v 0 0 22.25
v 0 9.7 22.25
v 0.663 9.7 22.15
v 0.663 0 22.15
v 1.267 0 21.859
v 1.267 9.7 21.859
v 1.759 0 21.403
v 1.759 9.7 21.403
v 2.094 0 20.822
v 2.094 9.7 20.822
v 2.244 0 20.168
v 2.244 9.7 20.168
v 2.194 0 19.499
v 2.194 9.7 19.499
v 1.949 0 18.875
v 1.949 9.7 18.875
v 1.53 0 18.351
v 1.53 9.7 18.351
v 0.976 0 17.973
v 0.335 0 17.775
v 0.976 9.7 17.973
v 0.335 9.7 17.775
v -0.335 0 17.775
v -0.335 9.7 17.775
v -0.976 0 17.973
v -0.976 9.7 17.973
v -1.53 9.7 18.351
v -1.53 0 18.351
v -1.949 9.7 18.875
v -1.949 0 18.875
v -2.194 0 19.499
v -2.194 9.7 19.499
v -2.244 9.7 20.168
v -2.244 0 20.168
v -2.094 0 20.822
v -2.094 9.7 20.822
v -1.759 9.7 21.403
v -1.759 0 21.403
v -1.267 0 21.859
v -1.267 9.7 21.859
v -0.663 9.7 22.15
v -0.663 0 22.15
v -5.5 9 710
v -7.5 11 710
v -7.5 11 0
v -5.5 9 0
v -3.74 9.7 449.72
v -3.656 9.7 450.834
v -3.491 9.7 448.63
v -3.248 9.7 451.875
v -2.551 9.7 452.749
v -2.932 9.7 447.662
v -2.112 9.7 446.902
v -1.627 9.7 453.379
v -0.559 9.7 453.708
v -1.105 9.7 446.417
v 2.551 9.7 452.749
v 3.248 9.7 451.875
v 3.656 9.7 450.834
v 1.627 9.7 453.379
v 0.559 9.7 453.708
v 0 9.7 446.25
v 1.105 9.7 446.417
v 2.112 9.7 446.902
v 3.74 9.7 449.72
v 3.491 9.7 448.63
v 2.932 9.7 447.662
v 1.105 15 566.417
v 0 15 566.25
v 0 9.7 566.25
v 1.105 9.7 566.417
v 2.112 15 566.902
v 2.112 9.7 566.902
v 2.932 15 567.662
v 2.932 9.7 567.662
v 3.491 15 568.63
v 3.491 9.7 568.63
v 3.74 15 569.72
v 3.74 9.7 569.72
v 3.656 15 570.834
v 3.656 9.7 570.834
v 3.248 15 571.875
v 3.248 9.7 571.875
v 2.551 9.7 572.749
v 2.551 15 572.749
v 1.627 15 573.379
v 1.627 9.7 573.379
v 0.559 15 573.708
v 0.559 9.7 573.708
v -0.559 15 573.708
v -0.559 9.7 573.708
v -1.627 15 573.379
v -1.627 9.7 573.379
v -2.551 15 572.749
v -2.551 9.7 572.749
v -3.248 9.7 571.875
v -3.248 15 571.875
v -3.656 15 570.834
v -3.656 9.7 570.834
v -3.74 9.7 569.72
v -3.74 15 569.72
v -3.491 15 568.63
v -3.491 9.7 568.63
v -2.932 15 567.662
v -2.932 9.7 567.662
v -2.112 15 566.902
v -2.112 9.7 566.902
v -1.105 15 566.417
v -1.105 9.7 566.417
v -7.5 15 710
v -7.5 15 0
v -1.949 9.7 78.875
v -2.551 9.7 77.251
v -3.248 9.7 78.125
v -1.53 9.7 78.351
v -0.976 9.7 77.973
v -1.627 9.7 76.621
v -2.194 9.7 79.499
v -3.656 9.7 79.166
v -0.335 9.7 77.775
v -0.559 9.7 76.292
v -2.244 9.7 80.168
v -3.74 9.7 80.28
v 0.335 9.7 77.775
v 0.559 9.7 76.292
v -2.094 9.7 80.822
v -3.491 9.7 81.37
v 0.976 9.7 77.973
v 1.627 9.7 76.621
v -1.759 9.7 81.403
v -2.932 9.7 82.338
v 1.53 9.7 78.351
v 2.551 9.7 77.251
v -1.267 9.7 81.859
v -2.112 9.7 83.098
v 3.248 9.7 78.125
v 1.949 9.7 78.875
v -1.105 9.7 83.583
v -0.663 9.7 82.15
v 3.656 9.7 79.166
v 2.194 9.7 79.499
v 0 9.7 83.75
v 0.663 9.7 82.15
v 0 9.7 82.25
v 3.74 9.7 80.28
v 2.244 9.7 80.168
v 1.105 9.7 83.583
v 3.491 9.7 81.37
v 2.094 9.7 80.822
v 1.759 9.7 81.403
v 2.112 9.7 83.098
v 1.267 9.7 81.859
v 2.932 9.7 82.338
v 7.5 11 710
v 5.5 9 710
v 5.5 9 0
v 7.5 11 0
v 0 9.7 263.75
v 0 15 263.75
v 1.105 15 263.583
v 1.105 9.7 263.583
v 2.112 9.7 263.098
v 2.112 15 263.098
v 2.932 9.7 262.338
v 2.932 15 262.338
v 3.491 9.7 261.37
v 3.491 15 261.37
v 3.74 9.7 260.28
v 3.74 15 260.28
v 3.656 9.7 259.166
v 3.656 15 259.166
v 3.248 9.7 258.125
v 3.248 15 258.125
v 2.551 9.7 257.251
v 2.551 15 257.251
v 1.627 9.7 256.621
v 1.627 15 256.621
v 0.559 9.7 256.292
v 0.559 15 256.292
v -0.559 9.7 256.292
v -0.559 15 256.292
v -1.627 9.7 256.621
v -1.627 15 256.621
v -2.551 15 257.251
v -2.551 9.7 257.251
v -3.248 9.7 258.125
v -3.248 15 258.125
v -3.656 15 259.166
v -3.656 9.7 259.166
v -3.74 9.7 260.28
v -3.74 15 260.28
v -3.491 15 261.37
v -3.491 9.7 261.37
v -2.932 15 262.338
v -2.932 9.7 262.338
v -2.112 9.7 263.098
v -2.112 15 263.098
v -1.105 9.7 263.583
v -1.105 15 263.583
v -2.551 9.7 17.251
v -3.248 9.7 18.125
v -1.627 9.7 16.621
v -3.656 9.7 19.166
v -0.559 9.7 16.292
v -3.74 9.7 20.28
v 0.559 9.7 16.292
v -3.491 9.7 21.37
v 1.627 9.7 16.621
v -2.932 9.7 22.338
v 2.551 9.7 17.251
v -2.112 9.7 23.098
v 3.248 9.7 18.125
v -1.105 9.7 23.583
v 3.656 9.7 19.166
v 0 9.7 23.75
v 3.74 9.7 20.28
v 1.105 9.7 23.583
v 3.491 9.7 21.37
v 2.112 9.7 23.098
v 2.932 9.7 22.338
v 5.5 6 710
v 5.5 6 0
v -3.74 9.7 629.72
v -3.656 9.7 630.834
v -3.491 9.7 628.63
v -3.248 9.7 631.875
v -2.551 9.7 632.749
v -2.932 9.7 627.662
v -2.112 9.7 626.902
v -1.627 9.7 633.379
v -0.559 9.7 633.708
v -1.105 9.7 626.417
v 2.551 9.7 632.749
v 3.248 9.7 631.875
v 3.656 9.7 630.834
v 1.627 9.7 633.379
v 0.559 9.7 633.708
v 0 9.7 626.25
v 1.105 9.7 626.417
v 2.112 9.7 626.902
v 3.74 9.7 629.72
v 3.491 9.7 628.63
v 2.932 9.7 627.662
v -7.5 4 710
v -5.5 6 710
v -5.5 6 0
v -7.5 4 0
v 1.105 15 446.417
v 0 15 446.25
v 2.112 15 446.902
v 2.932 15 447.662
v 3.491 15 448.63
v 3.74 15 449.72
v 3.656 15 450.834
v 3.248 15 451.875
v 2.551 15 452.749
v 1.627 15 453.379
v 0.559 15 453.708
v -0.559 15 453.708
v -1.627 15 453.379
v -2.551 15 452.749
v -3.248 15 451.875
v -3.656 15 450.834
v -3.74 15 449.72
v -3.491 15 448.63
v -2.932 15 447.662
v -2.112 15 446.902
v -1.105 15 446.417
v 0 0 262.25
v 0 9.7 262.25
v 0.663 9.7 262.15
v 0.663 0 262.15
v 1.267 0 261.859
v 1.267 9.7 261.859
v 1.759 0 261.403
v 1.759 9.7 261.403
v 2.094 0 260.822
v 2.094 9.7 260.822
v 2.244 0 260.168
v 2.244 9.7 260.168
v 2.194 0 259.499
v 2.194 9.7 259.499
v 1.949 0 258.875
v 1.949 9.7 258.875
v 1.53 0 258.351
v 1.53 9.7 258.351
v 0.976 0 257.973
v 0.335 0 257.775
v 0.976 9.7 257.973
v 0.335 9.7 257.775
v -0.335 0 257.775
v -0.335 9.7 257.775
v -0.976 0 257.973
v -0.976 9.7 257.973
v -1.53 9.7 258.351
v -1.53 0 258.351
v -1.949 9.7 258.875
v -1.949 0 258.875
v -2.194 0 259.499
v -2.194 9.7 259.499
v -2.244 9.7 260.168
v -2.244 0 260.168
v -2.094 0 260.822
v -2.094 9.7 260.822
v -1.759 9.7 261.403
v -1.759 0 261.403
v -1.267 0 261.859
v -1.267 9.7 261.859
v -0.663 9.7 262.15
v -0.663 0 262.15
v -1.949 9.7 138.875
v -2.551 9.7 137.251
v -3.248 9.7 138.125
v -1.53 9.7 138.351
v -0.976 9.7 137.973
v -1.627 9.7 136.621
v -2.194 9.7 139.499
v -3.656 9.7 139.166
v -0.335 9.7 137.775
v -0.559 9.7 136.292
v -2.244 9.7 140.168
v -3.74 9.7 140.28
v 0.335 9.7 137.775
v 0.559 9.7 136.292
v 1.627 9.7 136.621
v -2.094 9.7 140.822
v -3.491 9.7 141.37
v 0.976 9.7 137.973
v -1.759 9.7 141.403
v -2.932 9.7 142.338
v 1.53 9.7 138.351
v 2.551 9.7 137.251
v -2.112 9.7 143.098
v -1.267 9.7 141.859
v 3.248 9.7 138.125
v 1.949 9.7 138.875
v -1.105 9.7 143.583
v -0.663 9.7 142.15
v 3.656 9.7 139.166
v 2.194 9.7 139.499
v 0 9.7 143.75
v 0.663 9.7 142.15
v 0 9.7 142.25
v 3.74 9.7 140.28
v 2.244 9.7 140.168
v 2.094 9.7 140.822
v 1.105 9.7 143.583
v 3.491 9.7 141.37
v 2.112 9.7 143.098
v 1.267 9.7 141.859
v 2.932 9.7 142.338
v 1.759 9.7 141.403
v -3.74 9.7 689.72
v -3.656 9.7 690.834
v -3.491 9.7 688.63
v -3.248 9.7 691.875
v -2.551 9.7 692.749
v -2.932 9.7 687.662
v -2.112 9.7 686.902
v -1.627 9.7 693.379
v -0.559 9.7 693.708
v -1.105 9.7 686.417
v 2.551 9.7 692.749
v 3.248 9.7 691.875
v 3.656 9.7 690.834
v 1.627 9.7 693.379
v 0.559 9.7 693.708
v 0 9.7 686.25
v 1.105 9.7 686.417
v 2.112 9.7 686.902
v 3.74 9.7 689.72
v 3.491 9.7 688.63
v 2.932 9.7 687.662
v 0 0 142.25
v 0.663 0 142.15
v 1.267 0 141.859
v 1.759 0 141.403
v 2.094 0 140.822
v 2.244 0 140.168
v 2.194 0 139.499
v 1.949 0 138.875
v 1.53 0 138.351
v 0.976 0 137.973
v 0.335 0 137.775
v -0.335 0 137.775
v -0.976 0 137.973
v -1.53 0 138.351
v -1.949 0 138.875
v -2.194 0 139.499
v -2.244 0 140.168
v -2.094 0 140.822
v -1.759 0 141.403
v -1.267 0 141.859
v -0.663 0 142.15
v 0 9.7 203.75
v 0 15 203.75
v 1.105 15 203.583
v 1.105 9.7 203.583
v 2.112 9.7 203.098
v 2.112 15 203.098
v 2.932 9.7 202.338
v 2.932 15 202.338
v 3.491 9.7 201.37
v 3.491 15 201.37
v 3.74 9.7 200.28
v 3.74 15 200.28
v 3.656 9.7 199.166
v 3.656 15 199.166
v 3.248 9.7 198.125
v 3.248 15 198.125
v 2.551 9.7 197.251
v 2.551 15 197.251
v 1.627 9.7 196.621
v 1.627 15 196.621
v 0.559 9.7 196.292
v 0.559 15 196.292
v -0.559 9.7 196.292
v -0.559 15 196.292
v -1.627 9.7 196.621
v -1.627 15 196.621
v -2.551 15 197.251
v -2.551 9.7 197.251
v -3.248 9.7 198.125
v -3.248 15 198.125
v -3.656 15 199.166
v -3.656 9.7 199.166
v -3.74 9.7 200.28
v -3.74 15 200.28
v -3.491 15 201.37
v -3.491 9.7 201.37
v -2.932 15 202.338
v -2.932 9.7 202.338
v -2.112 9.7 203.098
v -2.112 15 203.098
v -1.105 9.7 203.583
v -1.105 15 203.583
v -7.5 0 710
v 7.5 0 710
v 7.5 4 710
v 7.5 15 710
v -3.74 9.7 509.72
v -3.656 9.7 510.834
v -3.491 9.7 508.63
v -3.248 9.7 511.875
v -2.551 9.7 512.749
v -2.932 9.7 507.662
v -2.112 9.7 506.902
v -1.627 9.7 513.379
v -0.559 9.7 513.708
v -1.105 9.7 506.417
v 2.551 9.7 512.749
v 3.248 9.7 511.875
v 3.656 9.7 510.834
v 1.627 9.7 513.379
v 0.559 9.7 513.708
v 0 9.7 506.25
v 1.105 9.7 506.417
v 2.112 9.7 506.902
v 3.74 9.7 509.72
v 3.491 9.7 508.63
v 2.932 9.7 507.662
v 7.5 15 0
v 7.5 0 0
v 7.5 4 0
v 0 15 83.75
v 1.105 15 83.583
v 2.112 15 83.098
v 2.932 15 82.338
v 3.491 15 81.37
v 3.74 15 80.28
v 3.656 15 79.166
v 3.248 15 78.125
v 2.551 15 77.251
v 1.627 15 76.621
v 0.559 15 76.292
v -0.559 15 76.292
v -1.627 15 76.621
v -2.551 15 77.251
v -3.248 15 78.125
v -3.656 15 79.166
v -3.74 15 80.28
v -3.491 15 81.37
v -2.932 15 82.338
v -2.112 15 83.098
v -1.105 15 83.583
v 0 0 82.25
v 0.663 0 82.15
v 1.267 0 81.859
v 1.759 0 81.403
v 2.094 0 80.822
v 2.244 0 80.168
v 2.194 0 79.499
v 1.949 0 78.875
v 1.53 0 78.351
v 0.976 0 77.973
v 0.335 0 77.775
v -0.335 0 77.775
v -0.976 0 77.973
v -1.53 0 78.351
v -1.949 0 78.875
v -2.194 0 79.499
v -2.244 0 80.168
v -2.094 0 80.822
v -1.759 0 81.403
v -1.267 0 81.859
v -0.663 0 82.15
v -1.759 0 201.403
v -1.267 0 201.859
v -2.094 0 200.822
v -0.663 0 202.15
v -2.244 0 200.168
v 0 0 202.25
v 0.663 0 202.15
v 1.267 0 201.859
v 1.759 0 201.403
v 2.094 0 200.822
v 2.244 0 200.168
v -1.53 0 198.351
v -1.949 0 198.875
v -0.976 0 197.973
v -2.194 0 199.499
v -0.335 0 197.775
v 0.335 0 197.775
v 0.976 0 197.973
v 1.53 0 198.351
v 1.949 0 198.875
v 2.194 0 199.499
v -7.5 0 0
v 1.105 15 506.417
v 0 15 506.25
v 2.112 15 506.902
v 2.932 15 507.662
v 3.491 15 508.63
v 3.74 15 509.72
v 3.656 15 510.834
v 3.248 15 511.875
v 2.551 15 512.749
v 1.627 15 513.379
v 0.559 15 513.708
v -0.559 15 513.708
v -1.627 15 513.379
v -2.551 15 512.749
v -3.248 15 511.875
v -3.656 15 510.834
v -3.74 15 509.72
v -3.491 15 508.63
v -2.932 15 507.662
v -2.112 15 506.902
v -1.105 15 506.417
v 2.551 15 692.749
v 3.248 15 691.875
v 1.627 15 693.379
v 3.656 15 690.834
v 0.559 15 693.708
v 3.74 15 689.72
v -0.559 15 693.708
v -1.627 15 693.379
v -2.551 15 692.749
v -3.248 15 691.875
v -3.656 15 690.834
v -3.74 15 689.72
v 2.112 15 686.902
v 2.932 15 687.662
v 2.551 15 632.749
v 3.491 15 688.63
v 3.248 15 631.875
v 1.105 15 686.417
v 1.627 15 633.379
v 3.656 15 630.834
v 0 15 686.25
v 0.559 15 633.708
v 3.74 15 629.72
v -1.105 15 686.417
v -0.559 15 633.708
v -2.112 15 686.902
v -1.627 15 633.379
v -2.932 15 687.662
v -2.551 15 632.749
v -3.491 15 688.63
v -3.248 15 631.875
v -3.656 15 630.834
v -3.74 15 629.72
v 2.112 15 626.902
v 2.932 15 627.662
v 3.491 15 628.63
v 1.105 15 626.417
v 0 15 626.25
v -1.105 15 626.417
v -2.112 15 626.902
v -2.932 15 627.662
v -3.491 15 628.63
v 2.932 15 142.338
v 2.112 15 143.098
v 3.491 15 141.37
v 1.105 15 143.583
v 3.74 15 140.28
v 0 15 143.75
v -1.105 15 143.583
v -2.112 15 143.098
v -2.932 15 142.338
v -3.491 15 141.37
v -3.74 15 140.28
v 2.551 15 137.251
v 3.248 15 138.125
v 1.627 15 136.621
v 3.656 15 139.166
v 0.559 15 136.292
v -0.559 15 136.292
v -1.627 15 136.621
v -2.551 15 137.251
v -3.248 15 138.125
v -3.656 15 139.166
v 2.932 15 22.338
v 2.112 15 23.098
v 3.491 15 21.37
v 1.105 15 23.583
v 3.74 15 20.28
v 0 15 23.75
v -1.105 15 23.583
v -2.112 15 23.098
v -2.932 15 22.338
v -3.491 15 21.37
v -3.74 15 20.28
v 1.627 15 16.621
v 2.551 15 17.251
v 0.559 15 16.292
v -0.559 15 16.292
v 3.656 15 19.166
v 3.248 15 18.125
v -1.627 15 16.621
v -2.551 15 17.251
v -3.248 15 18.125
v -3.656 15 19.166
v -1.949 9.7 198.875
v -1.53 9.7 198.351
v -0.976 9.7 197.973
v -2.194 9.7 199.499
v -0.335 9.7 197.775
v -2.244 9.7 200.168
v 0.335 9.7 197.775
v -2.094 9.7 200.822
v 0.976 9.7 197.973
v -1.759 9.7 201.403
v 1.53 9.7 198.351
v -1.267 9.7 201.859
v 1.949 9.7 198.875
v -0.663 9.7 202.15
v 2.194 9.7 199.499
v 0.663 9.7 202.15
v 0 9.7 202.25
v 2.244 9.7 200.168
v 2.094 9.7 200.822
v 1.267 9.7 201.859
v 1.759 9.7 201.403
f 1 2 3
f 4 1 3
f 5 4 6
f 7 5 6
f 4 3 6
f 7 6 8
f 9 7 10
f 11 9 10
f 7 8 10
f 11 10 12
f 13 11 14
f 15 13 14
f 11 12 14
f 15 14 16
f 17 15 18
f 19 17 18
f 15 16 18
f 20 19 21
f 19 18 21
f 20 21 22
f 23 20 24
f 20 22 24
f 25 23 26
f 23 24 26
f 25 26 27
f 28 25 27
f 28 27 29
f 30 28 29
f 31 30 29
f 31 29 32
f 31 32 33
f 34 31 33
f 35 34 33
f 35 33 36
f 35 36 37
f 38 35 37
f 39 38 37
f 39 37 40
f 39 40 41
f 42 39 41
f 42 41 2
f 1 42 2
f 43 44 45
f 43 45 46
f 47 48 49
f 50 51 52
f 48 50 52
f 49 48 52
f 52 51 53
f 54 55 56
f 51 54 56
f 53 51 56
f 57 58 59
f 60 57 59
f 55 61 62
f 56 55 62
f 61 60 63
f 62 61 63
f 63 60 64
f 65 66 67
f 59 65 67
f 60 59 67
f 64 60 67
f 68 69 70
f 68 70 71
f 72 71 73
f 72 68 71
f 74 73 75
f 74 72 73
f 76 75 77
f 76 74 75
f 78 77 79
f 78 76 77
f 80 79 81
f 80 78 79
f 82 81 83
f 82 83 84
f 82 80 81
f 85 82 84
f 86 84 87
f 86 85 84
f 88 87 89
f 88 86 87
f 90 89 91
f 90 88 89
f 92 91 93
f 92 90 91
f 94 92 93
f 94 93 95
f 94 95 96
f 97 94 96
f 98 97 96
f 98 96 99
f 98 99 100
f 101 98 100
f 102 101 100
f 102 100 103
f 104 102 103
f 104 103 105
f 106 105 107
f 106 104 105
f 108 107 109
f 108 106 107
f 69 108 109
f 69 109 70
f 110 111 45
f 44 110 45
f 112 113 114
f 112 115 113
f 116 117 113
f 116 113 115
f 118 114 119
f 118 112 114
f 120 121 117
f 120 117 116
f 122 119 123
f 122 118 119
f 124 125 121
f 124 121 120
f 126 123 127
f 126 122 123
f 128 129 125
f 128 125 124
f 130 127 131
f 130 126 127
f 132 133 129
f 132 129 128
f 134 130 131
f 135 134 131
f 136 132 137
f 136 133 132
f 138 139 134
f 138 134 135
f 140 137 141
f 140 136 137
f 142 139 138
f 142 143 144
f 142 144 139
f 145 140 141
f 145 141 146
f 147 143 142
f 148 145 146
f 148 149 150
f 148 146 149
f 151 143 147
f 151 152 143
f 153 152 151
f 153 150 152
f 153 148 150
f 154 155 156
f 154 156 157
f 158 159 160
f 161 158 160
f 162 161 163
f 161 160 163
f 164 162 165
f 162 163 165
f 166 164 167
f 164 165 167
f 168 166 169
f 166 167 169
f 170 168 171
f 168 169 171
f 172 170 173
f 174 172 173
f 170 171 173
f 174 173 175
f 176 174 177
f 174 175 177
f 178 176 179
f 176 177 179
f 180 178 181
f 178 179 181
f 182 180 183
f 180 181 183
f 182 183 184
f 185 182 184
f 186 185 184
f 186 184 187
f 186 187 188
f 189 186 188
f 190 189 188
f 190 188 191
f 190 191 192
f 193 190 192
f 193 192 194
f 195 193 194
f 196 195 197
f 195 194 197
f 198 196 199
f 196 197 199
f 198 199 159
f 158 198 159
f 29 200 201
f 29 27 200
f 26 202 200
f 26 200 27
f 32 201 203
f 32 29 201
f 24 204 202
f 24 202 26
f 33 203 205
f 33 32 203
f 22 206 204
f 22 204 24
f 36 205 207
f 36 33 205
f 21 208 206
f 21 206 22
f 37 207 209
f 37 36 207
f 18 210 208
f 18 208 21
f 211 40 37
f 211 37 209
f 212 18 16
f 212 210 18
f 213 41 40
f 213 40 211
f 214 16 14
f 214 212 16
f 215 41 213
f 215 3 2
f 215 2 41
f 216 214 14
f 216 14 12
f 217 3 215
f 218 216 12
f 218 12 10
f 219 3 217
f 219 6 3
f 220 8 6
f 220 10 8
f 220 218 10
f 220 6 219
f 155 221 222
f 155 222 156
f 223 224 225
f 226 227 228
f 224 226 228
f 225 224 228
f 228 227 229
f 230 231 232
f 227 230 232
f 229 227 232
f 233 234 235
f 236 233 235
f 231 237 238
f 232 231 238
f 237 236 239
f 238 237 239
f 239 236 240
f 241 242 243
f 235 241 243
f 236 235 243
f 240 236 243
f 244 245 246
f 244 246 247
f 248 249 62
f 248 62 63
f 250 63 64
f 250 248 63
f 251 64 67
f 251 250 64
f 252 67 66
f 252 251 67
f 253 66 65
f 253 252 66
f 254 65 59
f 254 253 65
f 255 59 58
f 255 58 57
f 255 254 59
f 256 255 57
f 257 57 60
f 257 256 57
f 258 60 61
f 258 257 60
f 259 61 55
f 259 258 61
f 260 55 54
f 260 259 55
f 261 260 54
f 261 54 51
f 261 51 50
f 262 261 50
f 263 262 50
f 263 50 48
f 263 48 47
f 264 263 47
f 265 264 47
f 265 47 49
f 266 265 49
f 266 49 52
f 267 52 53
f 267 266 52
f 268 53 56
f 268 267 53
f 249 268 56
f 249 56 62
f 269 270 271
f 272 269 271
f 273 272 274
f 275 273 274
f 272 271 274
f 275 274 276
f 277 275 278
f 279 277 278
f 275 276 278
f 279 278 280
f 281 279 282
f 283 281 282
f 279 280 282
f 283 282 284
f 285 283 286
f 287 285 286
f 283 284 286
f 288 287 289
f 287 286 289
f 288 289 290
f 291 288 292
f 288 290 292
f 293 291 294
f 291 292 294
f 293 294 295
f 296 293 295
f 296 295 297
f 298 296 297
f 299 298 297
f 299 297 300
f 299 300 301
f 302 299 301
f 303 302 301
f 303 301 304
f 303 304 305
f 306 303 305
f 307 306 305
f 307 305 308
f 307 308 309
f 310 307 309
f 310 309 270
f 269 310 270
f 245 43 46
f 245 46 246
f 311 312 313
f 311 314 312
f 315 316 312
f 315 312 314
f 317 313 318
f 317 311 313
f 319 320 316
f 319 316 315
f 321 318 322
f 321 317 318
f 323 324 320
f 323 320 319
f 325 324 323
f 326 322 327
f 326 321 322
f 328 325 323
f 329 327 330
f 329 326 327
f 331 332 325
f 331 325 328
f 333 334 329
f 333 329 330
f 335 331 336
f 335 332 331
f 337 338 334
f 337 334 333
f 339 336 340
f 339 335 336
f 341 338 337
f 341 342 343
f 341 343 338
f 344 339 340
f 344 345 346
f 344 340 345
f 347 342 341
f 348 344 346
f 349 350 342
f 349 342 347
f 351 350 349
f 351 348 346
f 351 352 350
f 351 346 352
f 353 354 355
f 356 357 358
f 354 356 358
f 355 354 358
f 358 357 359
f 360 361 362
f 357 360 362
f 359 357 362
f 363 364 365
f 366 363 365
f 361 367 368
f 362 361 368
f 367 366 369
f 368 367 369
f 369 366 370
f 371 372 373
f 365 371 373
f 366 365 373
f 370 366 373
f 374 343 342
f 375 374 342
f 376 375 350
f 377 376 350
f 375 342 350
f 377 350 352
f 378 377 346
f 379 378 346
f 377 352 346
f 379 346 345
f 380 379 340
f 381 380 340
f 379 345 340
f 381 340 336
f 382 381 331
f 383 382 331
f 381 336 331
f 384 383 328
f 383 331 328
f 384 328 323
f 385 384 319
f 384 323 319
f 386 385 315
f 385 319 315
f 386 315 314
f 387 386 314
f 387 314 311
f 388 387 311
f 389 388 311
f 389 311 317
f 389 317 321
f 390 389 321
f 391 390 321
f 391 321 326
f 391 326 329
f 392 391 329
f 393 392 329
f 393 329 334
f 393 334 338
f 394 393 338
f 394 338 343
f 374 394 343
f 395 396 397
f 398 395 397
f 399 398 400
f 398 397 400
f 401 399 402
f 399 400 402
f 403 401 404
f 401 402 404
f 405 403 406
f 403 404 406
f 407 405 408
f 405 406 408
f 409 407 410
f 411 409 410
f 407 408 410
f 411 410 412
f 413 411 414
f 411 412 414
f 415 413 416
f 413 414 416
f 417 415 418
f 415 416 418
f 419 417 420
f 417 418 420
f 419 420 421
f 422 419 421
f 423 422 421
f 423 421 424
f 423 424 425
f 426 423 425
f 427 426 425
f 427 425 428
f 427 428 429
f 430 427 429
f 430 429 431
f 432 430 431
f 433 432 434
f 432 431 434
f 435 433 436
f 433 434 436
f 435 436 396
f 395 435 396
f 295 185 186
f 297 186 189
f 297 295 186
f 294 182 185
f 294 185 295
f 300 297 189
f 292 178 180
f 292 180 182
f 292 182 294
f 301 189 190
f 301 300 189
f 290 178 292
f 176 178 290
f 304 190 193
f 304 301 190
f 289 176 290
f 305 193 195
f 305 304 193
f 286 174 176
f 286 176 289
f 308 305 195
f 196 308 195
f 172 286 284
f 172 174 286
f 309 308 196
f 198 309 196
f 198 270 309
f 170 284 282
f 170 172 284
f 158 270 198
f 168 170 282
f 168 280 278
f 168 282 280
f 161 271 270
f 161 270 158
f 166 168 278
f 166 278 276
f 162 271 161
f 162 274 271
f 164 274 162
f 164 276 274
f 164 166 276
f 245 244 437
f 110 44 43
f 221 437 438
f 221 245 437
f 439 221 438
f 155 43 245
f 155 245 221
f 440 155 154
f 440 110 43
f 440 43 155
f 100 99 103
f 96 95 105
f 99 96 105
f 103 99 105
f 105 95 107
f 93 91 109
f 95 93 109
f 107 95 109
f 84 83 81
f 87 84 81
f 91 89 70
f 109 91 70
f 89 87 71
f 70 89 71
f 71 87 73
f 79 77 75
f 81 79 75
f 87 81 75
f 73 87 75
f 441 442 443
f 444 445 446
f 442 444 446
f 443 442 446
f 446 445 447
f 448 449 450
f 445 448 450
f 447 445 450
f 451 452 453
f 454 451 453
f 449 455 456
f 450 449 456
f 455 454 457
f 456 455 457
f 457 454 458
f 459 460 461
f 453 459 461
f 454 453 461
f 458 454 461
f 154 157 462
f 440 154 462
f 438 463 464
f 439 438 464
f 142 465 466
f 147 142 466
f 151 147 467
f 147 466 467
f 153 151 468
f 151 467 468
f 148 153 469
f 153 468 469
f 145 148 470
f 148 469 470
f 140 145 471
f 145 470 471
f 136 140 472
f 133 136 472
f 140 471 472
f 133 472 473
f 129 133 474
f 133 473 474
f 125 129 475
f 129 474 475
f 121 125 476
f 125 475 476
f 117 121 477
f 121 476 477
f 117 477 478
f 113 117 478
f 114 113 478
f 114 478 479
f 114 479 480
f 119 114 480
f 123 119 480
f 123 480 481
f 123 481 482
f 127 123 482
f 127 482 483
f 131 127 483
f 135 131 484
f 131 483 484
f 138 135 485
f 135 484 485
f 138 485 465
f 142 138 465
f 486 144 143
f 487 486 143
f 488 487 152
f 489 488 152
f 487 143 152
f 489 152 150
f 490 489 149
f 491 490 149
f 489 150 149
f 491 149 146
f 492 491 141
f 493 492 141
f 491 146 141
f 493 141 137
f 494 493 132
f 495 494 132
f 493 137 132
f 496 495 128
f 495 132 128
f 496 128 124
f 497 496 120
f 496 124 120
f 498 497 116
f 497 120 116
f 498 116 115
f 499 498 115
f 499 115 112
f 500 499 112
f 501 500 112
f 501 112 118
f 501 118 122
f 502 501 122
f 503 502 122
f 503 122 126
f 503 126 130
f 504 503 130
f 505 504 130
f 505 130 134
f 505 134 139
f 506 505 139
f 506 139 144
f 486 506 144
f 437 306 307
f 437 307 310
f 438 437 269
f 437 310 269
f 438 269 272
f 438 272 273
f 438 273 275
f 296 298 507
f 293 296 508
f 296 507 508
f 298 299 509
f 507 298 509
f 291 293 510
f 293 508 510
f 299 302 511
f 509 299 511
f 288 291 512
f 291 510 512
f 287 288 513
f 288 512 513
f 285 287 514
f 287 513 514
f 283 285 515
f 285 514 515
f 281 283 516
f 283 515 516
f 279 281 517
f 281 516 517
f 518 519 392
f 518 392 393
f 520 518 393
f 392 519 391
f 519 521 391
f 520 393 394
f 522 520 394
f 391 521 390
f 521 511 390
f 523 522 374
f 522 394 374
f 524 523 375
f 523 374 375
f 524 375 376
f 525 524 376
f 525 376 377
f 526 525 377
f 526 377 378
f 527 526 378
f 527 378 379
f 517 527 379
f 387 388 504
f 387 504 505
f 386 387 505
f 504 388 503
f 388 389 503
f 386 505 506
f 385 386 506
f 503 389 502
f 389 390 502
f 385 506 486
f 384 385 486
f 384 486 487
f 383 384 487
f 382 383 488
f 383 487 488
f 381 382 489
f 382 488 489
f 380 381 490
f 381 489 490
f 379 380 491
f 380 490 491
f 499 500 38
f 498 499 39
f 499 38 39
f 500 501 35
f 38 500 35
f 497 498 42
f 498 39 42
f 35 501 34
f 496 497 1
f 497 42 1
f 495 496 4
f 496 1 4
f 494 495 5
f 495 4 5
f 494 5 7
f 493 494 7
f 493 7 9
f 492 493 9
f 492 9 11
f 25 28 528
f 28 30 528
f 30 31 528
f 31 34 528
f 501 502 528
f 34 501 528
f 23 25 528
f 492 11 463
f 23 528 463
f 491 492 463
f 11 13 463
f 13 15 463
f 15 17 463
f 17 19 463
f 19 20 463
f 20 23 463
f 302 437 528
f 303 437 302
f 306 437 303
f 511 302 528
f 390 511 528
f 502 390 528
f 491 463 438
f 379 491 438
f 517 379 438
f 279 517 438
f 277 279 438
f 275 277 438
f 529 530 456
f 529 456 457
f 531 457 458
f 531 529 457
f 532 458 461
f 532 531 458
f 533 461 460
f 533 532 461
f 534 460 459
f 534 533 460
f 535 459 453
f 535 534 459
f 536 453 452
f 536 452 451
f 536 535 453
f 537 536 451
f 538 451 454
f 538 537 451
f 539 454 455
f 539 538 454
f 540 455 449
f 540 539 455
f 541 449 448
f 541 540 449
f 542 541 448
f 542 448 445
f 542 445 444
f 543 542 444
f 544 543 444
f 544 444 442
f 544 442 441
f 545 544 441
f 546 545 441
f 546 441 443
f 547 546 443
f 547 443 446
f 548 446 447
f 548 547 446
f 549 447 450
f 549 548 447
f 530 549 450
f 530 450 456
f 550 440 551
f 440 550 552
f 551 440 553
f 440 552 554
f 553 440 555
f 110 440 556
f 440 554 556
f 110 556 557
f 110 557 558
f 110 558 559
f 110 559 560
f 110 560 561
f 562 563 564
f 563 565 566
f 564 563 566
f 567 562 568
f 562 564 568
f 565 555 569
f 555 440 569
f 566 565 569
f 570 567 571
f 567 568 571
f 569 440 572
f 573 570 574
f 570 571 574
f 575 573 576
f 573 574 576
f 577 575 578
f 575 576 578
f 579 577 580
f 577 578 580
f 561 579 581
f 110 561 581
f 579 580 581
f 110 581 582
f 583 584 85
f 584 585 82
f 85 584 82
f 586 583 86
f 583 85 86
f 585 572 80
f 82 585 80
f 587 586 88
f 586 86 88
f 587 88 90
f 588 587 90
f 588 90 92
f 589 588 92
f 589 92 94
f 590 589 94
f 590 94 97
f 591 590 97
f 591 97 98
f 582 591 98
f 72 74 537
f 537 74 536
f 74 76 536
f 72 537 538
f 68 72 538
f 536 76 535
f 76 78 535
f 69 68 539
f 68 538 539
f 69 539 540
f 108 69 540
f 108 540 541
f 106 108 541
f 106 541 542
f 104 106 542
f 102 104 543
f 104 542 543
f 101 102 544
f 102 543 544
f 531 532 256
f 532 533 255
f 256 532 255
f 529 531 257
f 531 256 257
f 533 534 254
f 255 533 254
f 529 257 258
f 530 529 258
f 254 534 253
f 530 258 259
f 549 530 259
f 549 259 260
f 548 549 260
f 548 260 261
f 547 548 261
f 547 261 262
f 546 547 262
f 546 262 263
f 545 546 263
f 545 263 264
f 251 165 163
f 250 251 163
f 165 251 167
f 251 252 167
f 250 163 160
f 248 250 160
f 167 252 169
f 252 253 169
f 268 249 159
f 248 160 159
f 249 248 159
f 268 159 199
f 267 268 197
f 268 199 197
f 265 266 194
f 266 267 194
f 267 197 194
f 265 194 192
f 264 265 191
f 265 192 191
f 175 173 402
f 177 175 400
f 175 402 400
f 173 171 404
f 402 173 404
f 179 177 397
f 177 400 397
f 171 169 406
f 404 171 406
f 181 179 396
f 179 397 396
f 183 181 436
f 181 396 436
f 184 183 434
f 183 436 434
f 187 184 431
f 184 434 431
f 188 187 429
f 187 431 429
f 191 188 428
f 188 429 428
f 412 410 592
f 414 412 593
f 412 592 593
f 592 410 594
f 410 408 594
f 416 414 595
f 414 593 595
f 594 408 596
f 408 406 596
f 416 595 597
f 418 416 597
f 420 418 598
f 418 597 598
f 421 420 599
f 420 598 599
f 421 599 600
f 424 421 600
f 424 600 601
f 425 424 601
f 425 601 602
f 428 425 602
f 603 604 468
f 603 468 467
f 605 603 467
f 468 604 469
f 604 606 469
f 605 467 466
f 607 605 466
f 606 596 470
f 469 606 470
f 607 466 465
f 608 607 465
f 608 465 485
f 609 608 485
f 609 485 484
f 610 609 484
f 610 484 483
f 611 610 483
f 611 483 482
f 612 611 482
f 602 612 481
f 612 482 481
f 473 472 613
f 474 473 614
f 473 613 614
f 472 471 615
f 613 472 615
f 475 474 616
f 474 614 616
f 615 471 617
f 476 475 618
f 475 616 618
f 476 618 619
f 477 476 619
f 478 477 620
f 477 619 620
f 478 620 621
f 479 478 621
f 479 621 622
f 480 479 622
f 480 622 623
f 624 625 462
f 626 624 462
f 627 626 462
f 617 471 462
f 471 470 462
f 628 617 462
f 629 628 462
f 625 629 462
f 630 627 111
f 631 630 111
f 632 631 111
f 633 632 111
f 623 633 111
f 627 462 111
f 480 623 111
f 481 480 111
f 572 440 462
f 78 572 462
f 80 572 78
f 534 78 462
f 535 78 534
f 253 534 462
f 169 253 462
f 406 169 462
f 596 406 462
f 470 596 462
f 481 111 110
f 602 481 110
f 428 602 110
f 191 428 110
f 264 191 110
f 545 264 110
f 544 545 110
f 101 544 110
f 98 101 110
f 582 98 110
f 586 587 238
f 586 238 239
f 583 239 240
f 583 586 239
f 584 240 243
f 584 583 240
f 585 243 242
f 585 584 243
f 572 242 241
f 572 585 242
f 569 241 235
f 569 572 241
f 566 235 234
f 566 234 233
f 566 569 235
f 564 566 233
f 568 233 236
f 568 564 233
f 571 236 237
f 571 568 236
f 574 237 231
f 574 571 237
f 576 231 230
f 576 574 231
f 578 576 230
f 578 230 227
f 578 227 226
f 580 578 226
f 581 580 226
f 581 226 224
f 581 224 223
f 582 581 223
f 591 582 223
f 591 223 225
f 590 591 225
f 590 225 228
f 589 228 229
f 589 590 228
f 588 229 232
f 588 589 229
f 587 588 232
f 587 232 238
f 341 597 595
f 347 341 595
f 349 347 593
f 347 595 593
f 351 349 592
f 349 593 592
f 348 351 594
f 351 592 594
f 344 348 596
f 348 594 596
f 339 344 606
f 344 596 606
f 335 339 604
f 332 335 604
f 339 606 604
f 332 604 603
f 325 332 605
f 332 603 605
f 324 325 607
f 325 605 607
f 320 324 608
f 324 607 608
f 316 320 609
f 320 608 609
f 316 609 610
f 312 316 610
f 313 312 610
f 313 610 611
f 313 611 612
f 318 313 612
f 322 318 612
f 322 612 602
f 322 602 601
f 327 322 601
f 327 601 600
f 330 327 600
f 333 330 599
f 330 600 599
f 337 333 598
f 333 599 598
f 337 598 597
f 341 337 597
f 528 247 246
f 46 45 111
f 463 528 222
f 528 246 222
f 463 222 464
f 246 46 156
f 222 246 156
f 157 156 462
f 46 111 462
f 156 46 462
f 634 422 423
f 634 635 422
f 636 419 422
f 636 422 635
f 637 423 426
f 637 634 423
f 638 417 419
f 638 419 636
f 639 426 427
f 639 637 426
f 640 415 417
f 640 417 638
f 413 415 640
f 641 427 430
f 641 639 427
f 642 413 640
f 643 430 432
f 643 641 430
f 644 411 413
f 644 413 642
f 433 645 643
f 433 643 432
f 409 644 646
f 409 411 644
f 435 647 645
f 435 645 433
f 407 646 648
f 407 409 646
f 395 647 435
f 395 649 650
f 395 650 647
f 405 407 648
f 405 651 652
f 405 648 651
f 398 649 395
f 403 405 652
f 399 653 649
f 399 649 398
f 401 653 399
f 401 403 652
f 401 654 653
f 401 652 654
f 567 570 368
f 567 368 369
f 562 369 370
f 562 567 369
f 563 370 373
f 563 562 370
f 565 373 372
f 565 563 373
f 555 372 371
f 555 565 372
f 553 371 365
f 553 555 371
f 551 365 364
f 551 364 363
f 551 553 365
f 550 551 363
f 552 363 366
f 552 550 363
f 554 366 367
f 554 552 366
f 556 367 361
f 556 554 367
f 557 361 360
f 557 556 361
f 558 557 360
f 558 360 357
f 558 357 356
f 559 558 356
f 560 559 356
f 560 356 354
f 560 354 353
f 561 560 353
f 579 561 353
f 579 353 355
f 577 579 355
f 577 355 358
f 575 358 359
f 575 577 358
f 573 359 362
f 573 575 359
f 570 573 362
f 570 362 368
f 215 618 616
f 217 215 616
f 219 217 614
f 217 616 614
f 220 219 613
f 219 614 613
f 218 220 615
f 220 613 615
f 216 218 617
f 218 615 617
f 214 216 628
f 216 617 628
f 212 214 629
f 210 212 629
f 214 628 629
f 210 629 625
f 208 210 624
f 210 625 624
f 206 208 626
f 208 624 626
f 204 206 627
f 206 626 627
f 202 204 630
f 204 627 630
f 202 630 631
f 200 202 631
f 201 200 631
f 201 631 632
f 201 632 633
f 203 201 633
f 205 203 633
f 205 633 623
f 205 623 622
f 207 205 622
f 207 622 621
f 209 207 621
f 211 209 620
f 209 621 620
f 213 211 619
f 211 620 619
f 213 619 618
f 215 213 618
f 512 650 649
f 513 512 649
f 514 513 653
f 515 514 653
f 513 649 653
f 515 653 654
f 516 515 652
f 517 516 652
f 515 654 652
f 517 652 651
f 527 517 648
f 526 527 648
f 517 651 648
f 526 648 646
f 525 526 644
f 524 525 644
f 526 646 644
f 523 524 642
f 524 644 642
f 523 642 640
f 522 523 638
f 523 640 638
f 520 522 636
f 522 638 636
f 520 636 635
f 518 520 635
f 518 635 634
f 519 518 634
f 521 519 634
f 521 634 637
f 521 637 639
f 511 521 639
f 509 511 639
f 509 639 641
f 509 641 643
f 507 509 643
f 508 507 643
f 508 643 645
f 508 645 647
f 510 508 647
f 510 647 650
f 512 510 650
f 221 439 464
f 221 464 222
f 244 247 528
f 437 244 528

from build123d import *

# Parameters (mm, degrees)
BOSS_EXTRUDE1_DEPTH = 710
SKETCH2_R           = 3.75
CUT_EXTRUDE1_DEPTH  = 5.3
SKETCH3_R           = 2.25
CUT_EXTRUDE2_DEPTH  = 711.198035762


with BuildPart() as part:
    # Sketch1 → Boss-Extrude1 (new body)
    with BuildSketch(Plane.XY):
        Polygon((-7.5, 0), (7.5, 0), (7.5, 4), (5.5, 6), (5.5, 9), (7.5, 11), (7.5, 15), (-7.5, 15), (-7.5, 11), (-5.5, 9), (-5.5, 6), (-7.5, 4), align=None)
    extrude(amount=BOSS_EXTRUDE1_DEPTH)

    # Sketch2 → Cut-Extrude1 (cut)
    with BuildSketch(Plane(origin=(0, 15, 0), x_dir=(1, 0, 0), z_dir=(0, 1, 0))):
        with Locations(Location((0, -20, 0), (0, 0, 270))):
            Circle(SKETCH2_R)
        with Locations(Location((0, -80, 0), (0, 0, 270))):
            Circle(SKETCH2_R)
        with Locations(Location((0, -140, 0), (0, 0, 270))):
            Circle(SKETCH2_R)
        with Locations(Location((0, -200, 0), (0, 0, 270))):
            Circle(SKETCH2_R)
        with Locations(Location((0, -260, 0), (0, 0, 270))):
            Circle(SKETCH2_R)
    cut_extrude1 = extrude(amount=-CUT_EXTRUDE1_DEPTH, mode=Mode.SUBTRACT)

    # Sketch3 → Cut-Extrude2 (cut, through all)
    with BuildSketch(Plane(origin=(0, 15, 0), x_dir=(1, 0, 0), z_dir=(0, 1, 0))):
        with Locations(Location((0, -20, 0), (0, 0, 270))):
            Circle(SKETCH3_R)
        with Locations(Location((0, -80, 0), (0, 0, 270))):
            Circle(SKETCH3_R)
        with Locations(Location((0, -140, 0), (0, 0, 270))):
            Circle(SKETCH3_R)
        with Locations(Location((0, -200, 0), (0, 0, 270))):
            Circle(SKETCH3_R)
        with Locations(Location((0, -260, 0), (0, 0, 270))):
            Circle(SKETCH3_R)
    extrude(amount=-CUT_EXTRUDE2_DEPTH, mode=Mode.SUBTRACT)

    # 镜向1: Cut-Extrude1 across plane
    add(cut_extrude1.mirror(Plane.XY.offset(355)), mode=Mode.SUBTRACT)


solid = part.part
